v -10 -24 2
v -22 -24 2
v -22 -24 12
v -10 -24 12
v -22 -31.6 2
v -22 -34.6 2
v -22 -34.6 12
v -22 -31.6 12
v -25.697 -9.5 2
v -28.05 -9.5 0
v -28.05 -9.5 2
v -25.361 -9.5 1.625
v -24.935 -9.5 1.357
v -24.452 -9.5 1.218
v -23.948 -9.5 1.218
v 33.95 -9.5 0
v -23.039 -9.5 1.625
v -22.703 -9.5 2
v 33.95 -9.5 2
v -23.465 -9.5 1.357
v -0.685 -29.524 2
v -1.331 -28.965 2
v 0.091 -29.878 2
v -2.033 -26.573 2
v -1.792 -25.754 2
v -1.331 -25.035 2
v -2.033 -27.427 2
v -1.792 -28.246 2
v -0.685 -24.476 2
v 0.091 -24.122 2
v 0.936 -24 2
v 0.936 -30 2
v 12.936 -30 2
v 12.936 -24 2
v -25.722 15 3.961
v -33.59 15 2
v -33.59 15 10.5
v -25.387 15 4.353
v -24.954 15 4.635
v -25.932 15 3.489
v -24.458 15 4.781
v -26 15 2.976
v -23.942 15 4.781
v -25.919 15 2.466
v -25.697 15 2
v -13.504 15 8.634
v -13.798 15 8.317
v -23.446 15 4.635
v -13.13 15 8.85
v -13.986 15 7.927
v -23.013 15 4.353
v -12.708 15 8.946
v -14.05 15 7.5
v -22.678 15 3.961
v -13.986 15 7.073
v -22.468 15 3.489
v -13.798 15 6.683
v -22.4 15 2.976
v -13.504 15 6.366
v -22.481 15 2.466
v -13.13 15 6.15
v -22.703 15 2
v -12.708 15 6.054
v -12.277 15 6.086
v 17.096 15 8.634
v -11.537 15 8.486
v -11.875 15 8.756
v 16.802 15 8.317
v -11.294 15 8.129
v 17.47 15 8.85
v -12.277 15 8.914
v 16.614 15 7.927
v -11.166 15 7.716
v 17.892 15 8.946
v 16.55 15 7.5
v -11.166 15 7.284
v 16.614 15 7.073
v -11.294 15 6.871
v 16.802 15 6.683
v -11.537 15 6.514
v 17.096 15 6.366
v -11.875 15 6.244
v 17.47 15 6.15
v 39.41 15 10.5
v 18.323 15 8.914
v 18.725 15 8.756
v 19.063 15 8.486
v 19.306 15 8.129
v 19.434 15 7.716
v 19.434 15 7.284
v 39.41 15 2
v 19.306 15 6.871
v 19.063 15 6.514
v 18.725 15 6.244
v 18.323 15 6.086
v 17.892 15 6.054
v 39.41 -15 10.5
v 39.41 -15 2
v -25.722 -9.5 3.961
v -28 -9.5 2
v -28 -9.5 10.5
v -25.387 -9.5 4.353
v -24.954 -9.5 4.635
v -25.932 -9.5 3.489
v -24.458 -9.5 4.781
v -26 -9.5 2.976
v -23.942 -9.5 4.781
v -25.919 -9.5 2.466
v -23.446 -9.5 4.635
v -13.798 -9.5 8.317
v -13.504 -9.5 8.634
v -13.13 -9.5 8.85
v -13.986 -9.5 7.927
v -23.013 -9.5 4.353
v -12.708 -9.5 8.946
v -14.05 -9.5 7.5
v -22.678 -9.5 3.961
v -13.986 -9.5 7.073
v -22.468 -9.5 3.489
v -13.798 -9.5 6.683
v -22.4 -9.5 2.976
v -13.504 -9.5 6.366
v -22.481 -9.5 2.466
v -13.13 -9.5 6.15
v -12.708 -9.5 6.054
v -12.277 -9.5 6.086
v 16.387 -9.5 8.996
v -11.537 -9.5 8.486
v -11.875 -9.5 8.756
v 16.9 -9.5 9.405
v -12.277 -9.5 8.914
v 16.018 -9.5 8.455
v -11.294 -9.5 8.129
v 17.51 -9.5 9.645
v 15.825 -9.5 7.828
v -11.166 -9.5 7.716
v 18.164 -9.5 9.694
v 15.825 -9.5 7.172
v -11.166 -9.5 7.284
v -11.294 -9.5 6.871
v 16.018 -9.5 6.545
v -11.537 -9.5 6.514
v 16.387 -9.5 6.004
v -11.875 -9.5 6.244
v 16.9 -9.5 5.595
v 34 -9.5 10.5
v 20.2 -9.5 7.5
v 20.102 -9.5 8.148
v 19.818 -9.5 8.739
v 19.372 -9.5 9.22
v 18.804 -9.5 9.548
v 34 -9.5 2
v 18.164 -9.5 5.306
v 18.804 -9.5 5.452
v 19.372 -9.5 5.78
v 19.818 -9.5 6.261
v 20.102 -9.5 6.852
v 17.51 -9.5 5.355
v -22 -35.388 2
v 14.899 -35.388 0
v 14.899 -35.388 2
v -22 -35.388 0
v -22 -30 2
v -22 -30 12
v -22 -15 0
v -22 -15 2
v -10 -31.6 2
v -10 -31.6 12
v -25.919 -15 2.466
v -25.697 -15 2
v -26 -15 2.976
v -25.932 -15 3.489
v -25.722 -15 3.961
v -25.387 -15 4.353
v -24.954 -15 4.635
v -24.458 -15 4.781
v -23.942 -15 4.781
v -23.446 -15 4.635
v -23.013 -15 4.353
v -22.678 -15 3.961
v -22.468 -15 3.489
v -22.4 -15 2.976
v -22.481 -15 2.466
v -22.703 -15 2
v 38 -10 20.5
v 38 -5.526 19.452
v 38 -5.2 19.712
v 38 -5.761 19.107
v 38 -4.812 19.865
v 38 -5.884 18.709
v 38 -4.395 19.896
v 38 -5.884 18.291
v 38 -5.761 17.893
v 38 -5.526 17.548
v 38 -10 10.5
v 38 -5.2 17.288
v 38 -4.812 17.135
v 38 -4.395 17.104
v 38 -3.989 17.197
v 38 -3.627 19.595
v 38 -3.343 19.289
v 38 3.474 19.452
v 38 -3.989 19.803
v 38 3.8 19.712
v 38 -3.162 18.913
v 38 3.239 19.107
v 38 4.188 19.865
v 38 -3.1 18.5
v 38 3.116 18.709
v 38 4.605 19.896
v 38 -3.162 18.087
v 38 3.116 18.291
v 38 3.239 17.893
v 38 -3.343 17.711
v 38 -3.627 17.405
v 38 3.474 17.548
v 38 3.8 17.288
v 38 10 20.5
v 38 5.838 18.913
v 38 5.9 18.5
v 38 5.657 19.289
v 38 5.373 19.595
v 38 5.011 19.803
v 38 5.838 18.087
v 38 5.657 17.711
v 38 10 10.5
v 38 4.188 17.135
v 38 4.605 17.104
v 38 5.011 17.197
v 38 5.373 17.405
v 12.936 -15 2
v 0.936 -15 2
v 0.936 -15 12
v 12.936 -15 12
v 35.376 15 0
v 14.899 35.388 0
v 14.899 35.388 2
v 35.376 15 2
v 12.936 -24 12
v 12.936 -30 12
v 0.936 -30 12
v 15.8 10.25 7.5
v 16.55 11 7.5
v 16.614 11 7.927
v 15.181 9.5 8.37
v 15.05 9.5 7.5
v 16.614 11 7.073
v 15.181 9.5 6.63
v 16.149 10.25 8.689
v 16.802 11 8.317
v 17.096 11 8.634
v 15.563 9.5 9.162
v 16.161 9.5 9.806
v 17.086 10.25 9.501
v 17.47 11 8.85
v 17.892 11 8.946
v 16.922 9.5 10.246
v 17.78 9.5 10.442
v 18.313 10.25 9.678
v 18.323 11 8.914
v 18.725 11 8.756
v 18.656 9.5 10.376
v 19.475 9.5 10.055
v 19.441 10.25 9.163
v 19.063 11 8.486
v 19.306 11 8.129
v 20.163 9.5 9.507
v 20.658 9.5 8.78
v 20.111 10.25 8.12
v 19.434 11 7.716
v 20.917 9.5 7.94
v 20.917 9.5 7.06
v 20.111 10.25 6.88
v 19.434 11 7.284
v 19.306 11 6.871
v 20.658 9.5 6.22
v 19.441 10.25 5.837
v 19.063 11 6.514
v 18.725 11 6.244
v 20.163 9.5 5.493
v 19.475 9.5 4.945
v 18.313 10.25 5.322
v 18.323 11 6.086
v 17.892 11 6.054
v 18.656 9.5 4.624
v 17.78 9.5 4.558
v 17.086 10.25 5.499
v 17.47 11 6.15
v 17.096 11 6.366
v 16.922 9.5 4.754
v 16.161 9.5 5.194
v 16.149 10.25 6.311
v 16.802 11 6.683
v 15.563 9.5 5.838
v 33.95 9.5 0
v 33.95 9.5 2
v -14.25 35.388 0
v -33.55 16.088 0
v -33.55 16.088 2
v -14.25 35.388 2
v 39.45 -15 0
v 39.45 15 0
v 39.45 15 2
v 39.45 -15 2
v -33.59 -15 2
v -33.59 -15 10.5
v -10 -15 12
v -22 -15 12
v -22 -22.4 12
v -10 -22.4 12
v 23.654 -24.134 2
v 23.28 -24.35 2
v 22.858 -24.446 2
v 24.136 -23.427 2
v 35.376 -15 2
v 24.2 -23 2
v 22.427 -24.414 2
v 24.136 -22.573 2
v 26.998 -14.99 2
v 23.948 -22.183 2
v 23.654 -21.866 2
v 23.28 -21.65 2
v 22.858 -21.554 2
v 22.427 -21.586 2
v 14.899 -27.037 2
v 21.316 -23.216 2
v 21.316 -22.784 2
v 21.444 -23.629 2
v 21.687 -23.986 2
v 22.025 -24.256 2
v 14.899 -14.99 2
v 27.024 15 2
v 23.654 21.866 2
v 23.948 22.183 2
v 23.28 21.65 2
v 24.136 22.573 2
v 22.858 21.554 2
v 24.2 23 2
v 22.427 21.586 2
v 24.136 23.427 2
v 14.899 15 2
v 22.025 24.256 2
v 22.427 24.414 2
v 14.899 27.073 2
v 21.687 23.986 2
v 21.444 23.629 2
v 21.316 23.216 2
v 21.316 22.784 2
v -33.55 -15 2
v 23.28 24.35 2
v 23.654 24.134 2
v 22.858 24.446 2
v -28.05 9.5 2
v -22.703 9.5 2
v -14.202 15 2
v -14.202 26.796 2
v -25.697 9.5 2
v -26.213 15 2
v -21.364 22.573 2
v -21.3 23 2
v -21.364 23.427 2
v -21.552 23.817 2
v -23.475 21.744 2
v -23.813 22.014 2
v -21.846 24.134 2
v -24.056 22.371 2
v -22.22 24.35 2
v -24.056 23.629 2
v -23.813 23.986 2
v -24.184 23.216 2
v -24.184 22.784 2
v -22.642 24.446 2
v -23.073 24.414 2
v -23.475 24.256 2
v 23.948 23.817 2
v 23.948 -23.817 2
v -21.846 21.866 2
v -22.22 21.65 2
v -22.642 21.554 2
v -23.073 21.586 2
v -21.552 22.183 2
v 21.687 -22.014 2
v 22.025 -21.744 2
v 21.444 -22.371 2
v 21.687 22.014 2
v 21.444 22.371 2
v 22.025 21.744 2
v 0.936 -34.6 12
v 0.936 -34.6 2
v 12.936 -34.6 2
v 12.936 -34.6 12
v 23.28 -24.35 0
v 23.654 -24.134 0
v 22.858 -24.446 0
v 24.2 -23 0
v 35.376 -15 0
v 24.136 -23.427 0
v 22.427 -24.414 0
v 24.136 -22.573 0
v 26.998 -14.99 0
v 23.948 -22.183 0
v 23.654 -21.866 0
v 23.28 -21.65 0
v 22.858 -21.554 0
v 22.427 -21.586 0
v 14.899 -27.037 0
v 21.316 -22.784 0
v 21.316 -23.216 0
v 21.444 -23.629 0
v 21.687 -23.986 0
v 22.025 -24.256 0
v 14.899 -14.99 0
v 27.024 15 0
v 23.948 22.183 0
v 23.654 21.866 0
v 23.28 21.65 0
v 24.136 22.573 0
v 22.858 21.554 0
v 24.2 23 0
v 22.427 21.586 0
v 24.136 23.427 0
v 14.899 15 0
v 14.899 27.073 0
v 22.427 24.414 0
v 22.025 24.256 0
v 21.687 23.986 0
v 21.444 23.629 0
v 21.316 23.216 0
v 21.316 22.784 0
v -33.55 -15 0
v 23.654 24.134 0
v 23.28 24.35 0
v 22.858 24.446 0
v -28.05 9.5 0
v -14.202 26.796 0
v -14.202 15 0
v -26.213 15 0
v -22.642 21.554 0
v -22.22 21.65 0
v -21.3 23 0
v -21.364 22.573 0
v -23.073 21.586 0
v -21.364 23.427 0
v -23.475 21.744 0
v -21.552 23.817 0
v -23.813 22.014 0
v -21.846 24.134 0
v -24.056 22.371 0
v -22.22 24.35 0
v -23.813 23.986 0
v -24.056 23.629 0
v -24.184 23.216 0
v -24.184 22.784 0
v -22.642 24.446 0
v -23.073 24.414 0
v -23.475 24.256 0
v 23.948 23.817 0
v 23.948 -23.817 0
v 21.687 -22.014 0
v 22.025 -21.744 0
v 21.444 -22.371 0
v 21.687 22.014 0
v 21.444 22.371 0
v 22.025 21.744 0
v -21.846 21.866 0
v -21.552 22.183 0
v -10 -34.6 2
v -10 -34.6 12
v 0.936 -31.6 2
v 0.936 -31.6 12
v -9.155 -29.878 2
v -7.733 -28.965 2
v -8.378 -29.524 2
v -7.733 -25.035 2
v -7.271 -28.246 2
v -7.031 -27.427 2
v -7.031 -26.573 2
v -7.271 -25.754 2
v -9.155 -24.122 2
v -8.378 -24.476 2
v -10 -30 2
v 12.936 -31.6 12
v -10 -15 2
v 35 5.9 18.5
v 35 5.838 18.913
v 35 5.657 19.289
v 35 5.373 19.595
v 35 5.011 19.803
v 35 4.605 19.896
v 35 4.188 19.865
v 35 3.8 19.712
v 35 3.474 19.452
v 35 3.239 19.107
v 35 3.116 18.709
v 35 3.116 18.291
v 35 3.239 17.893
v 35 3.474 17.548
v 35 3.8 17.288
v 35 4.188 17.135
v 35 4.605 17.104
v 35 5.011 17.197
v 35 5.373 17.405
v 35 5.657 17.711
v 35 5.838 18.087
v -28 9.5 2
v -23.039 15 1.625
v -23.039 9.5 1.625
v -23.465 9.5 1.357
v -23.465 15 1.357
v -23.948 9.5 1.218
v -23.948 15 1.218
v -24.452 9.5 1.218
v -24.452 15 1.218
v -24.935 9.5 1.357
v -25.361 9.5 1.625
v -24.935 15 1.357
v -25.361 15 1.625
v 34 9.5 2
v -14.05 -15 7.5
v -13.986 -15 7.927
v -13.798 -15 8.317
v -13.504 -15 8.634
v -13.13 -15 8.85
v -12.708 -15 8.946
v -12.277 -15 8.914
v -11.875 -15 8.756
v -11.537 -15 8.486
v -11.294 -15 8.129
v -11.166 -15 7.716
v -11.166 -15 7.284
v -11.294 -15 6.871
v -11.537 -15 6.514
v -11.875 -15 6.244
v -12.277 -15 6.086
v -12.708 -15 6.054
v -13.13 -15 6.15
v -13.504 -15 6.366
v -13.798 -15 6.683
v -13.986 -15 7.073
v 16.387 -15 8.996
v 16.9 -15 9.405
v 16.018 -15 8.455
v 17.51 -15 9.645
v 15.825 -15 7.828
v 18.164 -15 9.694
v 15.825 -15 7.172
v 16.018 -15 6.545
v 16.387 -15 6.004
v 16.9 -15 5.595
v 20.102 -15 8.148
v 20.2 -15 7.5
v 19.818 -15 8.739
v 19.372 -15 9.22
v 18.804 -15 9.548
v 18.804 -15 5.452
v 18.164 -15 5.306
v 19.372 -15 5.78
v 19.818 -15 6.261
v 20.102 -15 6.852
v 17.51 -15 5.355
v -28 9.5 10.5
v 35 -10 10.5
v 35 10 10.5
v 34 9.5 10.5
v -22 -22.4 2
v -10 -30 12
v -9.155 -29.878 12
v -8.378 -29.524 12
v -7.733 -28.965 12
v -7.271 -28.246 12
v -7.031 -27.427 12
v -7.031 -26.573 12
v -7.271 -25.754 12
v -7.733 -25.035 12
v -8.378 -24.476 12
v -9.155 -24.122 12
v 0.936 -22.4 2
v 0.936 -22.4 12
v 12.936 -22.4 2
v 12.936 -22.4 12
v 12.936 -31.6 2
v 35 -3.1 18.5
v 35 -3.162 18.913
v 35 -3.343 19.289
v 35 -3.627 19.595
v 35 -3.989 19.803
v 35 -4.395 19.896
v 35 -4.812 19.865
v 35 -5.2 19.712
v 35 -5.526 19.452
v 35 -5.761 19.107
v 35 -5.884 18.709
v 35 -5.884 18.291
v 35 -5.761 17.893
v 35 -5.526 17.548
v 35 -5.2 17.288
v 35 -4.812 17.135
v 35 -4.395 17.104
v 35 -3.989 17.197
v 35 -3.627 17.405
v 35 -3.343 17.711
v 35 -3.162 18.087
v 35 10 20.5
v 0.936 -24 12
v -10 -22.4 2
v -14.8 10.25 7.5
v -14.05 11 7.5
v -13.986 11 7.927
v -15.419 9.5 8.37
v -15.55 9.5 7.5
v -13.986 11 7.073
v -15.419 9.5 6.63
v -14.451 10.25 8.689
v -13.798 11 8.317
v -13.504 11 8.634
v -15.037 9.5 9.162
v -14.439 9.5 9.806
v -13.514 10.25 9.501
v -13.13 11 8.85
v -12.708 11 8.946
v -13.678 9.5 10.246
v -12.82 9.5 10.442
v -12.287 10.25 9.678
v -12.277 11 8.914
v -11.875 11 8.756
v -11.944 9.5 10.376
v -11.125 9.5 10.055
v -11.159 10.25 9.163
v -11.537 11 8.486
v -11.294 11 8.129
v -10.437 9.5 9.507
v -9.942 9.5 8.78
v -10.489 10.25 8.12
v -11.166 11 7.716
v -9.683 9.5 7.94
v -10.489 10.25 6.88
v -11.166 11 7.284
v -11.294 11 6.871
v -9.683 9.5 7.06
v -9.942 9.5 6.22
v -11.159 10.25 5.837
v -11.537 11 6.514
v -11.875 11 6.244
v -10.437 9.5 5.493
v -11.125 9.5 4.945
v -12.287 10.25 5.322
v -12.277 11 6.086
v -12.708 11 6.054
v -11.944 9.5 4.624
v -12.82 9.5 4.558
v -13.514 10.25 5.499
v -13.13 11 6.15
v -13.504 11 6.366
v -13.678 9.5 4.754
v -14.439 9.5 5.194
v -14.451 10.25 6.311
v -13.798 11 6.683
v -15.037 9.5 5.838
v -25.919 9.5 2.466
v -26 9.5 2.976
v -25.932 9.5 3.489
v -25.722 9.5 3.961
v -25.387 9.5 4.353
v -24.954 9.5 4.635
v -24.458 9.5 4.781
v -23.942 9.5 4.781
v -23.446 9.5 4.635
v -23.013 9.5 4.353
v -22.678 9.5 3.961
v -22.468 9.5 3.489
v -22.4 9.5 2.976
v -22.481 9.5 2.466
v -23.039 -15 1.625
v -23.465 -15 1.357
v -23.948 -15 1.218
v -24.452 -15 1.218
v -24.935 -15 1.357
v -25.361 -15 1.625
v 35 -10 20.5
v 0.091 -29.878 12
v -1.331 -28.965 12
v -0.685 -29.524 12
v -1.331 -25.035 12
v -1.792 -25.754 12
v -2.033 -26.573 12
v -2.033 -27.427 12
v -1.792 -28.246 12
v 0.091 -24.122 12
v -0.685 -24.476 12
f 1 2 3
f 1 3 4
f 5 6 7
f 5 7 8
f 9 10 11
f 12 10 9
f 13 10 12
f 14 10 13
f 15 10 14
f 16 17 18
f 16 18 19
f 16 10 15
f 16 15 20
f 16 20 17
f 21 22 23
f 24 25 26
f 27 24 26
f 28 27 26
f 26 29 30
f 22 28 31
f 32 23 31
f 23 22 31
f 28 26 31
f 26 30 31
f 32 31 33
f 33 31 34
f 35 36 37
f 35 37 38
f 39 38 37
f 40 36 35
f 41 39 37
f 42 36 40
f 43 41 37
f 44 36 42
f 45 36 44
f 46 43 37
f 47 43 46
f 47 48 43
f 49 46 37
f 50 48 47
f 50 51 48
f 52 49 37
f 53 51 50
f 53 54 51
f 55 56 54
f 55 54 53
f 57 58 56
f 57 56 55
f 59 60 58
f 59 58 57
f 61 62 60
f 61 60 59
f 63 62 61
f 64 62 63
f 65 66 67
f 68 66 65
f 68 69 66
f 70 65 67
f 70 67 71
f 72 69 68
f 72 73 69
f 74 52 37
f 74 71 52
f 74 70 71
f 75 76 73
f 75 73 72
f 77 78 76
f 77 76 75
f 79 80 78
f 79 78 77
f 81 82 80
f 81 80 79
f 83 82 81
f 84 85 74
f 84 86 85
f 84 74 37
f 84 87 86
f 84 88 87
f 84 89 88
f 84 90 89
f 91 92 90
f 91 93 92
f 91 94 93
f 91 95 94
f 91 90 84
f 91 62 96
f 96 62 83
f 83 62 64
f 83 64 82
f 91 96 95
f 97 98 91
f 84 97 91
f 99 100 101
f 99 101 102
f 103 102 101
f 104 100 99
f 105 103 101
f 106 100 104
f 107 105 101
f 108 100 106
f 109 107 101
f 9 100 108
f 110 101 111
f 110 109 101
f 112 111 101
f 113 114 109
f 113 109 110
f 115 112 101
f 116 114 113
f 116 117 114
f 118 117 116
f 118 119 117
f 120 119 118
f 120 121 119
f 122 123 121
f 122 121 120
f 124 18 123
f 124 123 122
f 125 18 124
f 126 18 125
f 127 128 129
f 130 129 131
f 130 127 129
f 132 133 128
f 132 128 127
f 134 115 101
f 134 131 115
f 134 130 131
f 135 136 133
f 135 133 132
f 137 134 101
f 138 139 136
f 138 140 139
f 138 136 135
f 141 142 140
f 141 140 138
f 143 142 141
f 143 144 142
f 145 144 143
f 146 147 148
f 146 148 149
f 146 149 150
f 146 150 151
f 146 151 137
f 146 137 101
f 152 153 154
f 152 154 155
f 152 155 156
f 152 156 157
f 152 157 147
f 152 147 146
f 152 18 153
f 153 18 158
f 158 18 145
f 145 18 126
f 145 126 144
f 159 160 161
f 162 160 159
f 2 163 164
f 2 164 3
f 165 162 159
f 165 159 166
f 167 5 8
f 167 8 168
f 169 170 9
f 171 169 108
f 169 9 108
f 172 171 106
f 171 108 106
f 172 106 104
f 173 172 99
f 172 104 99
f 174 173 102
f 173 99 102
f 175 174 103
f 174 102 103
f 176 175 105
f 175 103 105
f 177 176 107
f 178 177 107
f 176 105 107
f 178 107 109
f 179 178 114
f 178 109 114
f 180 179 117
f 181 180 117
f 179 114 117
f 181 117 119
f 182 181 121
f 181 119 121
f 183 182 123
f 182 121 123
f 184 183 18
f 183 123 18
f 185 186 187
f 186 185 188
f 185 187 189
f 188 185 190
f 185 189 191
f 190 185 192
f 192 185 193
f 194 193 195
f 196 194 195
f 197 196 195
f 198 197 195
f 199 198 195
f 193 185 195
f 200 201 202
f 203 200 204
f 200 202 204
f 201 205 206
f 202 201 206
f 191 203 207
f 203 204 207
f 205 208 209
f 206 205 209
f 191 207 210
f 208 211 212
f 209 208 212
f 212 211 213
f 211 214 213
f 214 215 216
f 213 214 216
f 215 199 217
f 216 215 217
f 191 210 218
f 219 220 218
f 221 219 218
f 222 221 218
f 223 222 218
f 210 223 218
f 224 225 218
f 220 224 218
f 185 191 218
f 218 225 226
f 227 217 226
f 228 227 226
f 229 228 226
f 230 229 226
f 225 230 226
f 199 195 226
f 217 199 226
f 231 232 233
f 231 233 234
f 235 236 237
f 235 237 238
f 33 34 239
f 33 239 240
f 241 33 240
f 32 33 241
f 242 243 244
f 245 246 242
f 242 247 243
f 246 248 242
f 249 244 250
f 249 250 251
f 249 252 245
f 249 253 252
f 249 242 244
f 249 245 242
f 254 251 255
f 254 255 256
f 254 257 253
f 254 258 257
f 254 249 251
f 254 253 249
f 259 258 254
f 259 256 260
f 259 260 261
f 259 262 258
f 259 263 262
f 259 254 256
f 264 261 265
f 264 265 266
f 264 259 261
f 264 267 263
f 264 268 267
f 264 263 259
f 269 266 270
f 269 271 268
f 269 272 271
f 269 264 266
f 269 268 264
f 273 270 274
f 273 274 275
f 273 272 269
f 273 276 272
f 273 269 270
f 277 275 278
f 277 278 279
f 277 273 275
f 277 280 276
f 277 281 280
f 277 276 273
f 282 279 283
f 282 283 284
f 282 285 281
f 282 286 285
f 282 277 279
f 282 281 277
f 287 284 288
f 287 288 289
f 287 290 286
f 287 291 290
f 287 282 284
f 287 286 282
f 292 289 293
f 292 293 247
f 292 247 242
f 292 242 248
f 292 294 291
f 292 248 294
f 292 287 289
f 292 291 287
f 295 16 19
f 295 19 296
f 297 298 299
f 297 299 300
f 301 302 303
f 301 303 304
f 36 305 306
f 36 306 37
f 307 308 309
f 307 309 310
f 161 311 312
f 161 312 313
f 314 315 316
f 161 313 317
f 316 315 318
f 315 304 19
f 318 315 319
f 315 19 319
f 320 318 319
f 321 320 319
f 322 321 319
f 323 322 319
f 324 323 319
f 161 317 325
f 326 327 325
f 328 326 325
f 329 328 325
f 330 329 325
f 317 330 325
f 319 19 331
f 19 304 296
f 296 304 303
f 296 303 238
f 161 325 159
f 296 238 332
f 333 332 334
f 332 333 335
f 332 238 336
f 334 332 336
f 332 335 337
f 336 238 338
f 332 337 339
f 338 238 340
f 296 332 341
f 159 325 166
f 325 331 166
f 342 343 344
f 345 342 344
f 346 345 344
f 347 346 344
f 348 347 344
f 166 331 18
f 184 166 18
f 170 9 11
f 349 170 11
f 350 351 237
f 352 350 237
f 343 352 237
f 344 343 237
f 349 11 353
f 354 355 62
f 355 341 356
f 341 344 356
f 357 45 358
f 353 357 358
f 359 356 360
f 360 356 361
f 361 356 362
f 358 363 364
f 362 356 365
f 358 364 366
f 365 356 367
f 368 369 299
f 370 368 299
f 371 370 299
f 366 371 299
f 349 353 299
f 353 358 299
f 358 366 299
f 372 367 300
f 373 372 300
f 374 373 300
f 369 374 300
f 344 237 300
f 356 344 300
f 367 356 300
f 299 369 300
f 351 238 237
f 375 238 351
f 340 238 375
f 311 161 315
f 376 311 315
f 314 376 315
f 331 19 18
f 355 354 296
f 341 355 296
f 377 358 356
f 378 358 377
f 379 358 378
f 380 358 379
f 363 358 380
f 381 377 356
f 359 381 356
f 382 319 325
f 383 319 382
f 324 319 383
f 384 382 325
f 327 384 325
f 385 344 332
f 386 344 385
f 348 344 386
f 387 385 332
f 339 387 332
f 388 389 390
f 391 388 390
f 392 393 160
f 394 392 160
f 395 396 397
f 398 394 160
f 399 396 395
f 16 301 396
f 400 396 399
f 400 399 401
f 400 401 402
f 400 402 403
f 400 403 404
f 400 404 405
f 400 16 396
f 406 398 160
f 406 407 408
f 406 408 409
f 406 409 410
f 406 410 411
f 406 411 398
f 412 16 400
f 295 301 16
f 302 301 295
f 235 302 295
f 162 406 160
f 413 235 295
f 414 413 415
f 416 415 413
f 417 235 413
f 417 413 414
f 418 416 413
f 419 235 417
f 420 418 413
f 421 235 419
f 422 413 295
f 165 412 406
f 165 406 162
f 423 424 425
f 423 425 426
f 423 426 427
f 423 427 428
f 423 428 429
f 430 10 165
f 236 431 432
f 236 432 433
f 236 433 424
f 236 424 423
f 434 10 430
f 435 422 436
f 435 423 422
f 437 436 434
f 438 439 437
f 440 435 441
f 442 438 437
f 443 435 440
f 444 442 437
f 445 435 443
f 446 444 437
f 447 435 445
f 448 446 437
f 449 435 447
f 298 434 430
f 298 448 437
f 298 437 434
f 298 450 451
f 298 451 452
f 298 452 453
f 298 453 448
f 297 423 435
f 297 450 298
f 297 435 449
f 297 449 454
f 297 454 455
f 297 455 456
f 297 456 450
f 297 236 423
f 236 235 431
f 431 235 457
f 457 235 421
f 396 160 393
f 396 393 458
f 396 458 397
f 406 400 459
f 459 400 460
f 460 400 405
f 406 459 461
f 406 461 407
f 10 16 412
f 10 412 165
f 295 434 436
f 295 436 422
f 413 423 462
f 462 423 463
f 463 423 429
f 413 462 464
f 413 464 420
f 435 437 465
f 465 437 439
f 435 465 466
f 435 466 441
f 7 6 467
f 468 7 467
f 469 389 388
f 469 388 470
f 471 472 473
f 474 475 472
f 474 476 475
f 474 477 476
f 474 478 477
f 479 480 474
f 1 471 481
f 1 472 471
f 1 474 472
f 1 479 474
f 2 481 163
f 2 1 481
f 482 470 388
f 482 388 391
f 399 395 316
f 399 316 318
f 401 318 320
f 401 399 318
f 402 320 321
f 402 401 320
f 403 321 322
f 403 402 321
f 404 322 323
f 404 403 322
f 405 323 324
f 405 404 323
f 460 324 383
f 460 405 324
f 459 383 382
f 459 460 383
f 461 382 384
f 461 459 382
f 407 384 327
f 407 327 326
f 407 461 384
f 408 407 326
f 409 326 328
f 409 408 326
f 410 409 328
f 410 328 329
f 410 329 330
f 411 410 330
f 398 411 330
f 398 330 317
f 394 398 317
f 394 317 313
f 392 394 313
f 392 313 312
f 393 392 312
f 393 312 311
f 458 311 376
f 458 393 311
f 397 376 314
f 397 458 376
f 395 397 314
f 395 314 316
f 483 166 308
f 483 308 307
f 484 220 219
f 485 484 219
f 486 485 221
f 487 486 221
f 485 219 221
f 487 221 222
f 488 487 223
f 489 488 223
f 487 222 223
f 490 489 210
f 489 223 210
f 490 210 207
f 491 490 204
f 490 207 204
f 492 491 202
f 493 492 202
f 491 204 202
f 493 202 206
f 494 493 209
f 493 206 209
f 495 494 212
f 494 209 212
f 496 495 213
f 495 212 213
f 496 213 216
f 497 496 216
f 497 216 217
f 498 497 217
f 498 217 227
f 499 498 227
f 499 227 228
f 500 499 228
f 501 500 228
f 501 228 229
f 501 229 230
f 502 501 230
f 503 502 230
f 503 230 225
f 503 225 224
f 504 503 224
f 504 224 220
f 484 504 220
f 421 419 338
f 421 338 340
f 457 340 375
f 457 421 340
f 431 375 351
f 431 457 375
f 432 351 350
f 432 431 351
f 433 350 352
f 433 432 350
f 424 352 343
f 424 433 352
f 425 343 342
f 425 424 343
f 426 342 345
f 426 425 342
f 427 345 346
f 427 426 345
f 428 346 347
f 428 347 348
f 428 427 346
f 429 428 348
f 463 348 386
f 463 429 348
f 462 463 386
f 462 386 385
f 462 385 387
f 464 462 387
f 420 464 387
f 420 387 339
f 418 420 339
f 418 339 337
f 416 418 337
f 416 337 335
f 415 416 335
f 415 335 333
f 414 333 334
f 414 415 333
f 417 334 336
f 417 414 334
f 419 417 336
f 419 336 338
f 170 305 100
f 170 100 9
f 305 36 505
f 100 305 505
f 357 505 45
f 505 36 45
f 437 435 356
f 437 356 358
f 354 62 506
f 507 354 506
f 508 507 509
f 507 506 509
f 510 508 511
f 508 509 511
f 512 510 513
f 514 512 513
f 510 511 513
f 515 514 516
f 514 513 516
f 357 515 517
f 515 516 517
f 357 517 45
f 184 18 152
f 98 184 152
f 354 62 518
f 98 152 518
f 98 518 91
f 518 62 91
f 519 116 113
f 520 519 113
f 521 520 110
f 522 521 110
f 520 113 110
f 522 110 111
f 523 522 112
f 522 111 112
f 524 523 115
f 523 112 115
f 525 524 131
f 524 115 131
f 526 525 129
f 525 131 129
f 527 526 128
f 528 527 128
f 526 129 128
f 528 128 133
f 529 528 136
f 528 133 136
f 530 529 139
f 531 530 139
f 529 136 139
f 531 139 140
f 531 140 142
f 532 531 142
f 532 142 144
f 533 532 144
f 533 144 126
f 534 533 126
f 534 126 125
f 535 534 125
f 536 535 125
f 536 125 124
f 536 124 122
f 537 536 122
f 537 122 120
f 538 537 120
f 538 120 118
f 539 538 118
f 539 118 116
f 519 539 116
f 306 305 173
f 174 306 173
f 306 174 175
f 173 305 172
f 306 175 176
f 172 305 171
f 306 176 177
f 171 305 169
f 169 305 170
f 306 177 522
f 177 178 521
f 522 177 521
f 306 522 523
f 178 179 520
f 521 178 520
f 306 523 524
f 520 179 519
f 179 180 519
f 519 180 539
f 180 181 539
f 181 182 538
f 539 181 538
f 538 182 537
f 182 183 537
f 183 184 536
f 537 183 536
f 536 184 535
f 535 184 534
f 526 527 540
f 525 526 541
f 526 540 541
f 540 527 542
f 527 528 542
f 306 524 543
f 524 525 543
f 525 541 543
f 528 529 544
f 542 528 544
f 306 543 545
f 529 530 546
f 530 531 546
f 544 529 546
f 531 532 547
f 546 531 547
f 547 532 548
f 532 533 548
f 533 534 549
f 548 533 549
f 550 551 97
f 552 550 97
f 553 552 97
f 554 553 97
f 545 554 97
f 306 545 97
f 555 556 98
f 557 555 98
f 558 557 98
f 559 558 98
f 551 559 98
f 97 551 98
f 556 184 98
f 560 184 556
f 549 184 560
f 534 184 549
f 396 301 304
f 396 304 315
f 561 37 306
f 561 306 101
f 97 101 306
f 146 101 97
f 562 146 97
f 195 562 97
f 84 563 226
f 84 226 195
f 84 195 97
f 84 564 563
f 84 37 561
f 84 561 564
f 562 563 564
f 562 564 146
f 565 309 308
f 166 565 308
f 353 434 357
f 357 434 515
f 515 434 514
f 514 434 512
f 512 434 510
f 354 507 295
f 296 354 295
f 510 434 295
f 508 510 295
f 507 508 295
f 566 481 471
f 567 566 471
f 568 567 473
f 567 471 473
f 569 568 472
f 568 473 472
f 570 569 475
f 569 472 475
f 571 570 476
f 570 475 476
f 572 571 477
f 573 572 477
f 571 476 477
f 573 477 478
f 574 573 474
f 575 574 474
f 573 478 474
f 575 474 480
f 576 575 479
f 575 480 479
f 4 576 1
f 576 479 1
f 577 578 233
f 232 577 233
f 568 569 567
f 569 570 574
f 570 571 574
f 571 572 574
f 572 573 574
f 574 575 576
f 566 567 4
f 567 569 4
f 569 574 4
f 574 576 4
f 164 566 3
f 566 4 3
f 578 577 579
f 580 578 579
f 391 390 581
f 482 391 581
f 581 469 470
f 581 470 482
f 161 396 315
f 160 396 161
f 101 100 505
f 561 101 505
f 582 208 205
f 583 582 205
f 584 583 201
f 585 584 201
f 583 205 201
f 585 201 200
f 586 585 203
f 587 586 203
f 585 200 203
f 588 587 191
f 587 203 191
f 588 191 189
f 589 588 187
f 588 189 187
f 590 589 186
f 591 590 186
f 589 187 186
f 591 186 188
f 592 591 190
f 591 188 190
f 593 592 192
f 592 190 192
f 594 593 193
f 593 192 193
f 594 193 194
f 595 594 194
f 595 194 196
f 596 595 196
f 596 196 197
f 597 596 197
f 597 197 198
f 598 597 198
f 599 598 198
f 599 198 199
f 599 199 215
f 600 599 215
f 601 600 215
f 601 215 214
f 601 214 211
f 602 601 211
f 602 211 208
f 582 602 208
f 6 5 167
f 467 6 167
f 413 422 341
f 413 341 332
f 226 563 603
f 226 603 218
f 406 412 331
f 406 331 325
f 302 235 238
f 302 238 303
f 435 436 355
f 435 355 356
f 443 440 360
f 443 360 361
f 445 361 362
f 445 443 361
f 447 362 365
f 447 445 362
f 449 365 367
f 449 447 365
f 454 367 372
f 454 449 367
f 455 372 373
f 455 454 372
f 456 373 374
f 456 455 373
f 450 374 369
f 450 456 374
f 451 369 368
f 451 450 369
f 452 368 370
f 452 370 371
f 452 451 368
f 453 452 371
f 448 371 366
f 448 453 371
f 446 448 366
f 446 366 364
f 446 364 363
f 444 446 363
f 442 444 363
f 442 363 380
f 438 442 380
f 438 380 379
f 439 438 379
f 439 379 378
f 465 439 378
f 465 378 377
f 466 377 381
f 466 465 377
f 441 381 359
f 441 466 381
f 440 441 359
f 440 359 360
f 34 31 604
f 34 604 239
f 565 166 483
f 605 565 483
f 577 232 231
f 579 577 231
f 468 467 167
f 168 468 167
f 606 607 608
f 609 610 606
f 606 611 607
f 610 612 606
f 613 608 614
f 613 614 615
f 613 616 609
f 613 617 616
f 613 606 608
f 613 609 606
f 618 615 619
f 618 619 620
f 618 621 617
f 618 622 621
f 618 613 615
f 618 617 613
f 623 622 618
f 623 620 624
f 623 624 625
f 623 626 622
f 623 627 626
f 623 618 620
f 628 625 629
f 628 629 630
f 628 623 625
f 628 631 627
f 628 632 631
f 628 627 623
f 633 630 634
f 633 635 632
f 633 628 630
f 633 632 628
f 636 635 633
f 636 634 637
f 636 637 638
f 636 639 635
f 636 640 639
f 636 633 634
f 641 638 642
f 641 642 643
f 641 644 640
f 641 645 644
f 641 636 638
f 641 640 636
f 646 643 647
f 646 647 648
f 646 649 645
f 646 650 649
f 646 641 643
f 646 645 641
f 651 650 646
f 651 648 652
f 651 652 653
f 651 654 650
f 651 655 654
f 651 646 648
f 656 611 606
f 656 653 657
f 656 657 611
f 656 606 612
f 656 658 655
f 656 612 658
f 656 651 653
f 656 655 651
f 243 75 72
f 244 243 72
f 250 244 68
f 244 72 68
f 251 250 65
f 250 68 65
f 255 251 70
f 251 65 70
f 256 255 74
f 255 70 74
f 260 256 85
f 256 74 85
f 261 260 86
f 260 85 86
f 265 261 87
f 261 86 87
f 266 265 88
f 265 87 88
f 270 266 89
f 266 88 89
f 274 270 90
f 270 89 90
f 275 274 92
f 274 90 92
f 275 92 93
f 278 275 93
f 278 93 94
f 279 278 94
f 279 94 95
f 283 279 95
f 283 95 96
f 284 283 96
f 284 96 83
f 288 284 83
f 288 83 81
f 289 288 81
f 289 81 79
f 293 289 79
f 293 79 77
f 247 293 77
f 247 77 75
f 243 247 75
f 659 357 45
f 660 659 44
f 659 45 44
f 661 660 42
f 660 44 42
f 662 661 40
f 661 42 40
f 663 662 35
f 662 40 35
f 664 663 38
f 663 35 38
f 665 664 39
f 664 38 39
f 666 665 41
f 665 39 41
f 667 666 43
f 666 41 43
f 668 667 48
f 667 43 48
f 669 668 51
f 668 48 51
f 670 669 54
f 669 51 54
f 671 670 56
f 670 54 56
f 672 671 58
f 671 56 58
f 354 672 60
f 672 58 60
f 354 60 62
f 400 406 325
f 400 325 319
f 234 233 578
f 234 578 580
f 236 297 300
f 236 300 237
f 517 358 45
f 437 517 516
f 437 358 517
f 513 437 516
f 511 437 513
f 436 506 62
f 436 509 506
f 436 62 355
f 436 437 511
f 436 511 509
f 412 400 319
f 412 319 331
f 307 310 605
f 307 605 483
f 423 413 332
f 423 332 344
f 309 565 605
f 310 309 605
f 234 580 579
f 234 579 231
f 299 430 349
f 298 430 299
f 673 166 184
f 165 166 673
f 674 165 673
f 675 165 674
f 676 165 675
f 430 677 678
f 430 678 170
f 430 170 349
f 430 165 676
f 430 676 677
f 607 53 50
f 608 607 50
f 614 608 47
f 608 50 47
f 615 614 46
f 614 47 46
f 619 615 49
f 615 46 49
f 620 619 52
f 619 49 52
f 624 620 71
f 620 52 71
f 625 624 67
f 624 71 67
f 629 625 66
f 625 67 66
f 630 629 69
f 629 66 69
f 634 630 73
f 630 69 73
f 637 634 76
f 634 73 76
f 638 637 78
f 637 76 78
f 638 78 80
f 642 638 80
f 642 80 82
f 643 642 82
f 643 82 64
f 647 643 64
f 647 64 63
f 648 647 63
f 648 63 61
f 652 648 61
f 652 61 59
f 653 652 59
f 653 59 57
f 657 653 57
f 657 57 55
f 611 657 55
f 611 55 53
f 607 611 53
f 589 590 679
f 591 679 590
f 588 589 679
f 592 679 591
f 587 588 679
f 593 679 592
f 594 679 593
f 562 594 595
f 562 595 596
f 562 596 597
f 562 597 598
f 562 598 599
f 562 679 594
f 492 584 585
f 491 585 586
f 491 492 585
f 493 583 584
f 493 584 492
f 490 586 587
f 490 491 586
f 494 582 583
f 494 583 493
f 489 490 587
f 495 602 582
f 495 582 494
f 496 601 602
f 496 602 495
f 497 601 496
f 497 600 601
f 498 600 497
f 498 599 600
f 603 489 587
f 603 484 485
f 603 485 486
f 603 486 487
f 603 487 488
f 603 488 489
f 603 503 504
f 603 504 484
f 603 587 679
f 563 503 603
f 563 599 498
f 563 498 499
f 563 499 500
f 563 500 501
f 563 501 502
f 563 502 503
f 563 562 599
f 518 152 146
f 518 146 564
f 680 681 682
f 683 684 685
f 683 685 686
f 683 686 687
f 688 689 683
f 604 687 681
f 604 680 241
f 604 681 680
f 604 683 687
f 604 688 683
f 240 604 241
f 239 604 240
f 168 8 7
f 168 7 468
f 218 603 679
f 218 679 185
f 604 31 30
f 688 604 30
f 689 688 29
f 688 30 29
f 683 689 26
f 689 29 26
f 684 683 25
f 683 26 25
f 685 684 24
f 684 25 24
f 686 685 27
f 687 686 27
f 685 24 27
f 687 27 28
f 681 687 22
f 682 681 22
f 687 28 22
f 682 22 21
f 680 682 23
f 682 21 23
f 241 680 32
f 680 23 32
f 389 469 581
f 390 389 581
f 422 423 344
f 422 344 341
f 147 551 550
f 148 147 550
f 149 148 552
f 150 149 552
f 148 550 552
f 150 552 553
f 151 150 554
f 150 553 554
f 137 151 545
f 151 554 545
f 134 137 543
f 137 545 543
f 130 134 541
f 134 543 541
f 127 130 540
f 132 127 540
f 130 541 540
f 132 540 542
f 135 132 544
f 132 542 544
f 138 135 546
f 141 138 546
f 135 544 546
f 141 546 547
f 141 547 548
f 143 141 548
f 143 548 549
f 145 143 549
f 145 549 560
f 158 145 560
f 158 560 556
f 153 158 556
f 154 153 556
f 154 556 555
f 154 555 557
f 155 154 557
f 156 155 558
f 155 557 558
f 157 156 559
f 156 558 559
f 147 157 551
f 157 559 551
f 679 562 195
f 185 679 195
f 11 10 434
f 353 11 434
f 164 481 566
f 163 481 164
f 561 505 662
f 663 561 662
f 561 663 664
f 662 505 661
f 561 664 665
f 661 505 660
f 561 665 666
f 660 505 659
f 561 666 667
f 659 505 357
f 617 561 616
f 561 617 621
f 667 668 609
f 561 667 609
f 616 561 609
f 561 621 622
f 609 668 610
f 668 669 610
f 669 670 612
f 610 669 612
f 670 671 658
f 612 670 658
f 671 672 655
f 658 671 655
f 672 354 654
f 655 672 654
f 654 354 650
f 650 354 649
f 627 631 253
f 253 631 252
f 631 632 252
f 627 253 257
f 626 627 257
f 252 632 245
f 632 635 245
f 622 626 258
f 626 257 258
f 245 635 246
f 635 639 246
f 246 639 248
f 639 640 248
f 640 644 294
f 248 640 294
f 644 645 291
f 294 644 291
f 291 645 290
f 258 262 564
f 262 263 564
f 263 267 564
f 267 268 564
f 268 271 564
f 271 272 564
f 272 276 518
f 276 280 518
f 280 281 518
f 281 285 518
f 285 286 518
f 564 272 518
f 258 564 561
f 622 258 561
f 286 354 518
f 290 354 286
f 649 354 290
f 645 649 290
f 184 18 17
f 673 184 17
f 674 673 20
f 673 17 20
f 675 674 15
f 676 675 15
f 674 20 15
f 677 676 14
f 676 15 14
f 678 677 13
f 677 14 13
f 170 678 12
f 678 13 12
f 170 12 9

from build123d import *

# Parameters (mm, degrees)
SKETCH002_W     = 12
SKETCH002_H     = 7.4
SKETCH002_H_2   = 3
PAD002_DEPTH    = 10
SKETCH_R        = 1.45
SKETCH_W        = 62
SKETCH_H        = 19
PAD_DEPTH       = 2
SKETCH004_R     = 1.8
POCKET005_DEPTH = 50
SKETCH001_W     = 73
SKETCH001_H     = 30
SKETCH001_W_2   = 62
SKETCH001_H_2   = 19
PAD004_DEPTH    = 8.5
SKETCH003_R     = 1.45
SKETCH003_R_2   = 1.8
POCKET004_DEPTH = 50
SKETCH005_R     = 2.2
POCKET_DEPTH    = 5.5
CHAMFER_SIZE    = 1.5
SKETCH006_W     = 3
SKETCH006_H     = 20
PAD005_DEPTH    = 10
SKETCH007_R     = 1.4
POCKET006_DEPTH = 5


with BuildPart() as pad002:
    # Sketch002 → Pad002 (new body)
    with BuildSketch(Plane.XY.offset(2)):
        with BuildLine():
            Line((-22, -24), (-10, -24))
            ThreePointArc((-10, -30), (-7, -27), (-10, -24))
            Line((-10, -30), (-22, -30))
            Line((-22, -30), (-22, -24))
        make_face()
        with Locations((-16, -18.7)):
            Rectangle(SKETCH002_W, SKETCH002_H)
        with Locations((6.936471, -18.7)):
            Rectangle(SKETCH002_W, SKETCH002_H)
        with BuildLine():
            ThreePointArc((0.936471, -24), (-2.063529, -27), (0.936471, -30))
            Line((12.936471, -30), (0.936471, -30))
            Line((12.936471, -24), (12.936471, -30))
            Line((0.936471, -24), (12.936471, -24))
        make_face()
        with Locations((-16, -33.1)):
            Rectangle(SKETCH002_W, SKETCH002_H_2)
        with Locations((6.936471, -33.1)):
            Rectangle(SKETCH002_W, SKETCH002_H_2)
    extrude(amount=PAD002_DEPTH)


with BuildPart() as pocket005:
    # Sketch → Pad (new body)
    with BuildSketch(Plane.XY):
        Polygon((-33.55, 16.0884), (-14.25, 35.3884), (14.898722, 35.3884), (35.37564, 15), (39.45, 15), (39.45, -15), (35.37564, -15), (14.89872, -35.3884), (-22, -35.3884), (-22, -15), (-33.55, -15), align=None)
        with Locations((-22.75, 23)):
            Circle(SKETCH_R, mode=Mode.SUBTRACT)
        with Locations((22.75, 23)):
            Circle(SKETCH_R, mode=Mode.SUBTRACT)
        with Locations((22.75, -23)):
            Circle(SKETCH_R, mode=Mode.SUBTRACT)
        with Locations((2.95, 0)):
            Rectangle(SKETCH_W, SKETCH_H, mode=Mode.SUBTRACT)
        Polygon((-14.202042, 26.795792), (-26.212802, 14.999997), (-14.202042, 14.999997), align=None, mode=Mode.SUBTRACT)
        Polygon((27.024401, 15), (14.898758, 27.073226), (14.898758, 15), align=None, mode=Mode.SUBTRACT)
        Polygon((14.898758, -27.037122), (26.998465, -14.989721), (14.898758, -14.989721), align=None, mode=Mode.SUBTRACT)
    extrude(amount=PAD_DEPTH)

    # Sketch004 → Pocket005 (cut)
    with BuildSketch(Plane(origin=(0, 15, 0), x_dir=(-1, 0, 0), z_dir=(0, 1, 0))):
        with Locations((24.2, 3)):
            Circle(SKETCH004_R)
    extrude(amount=-POCKET005_DEPTH, mode=Mode.SUBTRACT)


with BuildPart() as pocket006:
    # Sketch001 → Pad004 (new body)
    with BuildSketch(Plane.XY.offset(2)):
        with Locations((2.91, 0)):
            Rectangle(SKETCH001_W, SKETCH001_H)
        with Locations((3, 0)):
            Rectangle(SKETCH001_W_2, SKETCH001_H_2, mode=Mode.SUBTRACT)
    extrude(amount=PAD004_DEPTH)

    # Sketch003 → Pocket004 (cut)
    with BuildSketch(Plane(origin=(0, 15, 2), x_dir=(-1, 0, 0), z_dir=(0, 1, 0))):
        with Locations((-18, 5.5)):
            Circle(SKETCH003_R)
        with Locations((12.6, 5.5)):
            Circle(SKETCH003_R)
        with Locations((24.2, 1)):
            Circle(SKETCH003_R_2)
    extrude(amount=-POCKET004_DEPTH, mode=Mode.SUBTRACT)

    # Sketch005 → Pocket (cut)
    with BuildSketch(Plane(origin=(0, -15, 2), x_dir=(1, 0, 0), z_dir=(0, -1, 0))):
        with Locations((18, 5.5)):
            Circle(SKETCH005_R)
    extrude(amount=-POCKET_DEPTH, mode=Mode.SUBTRACT)

    # Chamfer
    chamfer_edges = [pocket006.edges().sort_by_distance(p)[0] for p in [
        (19.45, 9.5, 7.5),
        (-11.15, 9.5, 7.5),
    ]]
    chamfer(chamfer_edges, length=CHAMFER_SIZE)

    # Sketch006 → Pad005 (new body)
    with BuildSketch(Plane.XY.offset(10.5)):
        with Locations((36.5, 0)):
            Rectangle(SKETCH006_W, SKETCH006_H)
    extrude(amount=PAD005_DEPTH)

    # Sketch007 → Pocket006 (cut)
    with BuildSketch(Plane(origin=(38, 0, 2), x_dir=(0, 1, 0), z_dir=(1, 0, 0))):
        with Locations((-4.5, 16.5)):
            Circle(SKETCH007_R)
        with Locations((4.5, 16.5)):
            Circle(SKETCH007_R)
    extrude(amount=-POCKET006_DEPTH, mode=Mode.SUBTRACT)


solid = Compound([pad002.part, pocket005.part, pocket006.part])
